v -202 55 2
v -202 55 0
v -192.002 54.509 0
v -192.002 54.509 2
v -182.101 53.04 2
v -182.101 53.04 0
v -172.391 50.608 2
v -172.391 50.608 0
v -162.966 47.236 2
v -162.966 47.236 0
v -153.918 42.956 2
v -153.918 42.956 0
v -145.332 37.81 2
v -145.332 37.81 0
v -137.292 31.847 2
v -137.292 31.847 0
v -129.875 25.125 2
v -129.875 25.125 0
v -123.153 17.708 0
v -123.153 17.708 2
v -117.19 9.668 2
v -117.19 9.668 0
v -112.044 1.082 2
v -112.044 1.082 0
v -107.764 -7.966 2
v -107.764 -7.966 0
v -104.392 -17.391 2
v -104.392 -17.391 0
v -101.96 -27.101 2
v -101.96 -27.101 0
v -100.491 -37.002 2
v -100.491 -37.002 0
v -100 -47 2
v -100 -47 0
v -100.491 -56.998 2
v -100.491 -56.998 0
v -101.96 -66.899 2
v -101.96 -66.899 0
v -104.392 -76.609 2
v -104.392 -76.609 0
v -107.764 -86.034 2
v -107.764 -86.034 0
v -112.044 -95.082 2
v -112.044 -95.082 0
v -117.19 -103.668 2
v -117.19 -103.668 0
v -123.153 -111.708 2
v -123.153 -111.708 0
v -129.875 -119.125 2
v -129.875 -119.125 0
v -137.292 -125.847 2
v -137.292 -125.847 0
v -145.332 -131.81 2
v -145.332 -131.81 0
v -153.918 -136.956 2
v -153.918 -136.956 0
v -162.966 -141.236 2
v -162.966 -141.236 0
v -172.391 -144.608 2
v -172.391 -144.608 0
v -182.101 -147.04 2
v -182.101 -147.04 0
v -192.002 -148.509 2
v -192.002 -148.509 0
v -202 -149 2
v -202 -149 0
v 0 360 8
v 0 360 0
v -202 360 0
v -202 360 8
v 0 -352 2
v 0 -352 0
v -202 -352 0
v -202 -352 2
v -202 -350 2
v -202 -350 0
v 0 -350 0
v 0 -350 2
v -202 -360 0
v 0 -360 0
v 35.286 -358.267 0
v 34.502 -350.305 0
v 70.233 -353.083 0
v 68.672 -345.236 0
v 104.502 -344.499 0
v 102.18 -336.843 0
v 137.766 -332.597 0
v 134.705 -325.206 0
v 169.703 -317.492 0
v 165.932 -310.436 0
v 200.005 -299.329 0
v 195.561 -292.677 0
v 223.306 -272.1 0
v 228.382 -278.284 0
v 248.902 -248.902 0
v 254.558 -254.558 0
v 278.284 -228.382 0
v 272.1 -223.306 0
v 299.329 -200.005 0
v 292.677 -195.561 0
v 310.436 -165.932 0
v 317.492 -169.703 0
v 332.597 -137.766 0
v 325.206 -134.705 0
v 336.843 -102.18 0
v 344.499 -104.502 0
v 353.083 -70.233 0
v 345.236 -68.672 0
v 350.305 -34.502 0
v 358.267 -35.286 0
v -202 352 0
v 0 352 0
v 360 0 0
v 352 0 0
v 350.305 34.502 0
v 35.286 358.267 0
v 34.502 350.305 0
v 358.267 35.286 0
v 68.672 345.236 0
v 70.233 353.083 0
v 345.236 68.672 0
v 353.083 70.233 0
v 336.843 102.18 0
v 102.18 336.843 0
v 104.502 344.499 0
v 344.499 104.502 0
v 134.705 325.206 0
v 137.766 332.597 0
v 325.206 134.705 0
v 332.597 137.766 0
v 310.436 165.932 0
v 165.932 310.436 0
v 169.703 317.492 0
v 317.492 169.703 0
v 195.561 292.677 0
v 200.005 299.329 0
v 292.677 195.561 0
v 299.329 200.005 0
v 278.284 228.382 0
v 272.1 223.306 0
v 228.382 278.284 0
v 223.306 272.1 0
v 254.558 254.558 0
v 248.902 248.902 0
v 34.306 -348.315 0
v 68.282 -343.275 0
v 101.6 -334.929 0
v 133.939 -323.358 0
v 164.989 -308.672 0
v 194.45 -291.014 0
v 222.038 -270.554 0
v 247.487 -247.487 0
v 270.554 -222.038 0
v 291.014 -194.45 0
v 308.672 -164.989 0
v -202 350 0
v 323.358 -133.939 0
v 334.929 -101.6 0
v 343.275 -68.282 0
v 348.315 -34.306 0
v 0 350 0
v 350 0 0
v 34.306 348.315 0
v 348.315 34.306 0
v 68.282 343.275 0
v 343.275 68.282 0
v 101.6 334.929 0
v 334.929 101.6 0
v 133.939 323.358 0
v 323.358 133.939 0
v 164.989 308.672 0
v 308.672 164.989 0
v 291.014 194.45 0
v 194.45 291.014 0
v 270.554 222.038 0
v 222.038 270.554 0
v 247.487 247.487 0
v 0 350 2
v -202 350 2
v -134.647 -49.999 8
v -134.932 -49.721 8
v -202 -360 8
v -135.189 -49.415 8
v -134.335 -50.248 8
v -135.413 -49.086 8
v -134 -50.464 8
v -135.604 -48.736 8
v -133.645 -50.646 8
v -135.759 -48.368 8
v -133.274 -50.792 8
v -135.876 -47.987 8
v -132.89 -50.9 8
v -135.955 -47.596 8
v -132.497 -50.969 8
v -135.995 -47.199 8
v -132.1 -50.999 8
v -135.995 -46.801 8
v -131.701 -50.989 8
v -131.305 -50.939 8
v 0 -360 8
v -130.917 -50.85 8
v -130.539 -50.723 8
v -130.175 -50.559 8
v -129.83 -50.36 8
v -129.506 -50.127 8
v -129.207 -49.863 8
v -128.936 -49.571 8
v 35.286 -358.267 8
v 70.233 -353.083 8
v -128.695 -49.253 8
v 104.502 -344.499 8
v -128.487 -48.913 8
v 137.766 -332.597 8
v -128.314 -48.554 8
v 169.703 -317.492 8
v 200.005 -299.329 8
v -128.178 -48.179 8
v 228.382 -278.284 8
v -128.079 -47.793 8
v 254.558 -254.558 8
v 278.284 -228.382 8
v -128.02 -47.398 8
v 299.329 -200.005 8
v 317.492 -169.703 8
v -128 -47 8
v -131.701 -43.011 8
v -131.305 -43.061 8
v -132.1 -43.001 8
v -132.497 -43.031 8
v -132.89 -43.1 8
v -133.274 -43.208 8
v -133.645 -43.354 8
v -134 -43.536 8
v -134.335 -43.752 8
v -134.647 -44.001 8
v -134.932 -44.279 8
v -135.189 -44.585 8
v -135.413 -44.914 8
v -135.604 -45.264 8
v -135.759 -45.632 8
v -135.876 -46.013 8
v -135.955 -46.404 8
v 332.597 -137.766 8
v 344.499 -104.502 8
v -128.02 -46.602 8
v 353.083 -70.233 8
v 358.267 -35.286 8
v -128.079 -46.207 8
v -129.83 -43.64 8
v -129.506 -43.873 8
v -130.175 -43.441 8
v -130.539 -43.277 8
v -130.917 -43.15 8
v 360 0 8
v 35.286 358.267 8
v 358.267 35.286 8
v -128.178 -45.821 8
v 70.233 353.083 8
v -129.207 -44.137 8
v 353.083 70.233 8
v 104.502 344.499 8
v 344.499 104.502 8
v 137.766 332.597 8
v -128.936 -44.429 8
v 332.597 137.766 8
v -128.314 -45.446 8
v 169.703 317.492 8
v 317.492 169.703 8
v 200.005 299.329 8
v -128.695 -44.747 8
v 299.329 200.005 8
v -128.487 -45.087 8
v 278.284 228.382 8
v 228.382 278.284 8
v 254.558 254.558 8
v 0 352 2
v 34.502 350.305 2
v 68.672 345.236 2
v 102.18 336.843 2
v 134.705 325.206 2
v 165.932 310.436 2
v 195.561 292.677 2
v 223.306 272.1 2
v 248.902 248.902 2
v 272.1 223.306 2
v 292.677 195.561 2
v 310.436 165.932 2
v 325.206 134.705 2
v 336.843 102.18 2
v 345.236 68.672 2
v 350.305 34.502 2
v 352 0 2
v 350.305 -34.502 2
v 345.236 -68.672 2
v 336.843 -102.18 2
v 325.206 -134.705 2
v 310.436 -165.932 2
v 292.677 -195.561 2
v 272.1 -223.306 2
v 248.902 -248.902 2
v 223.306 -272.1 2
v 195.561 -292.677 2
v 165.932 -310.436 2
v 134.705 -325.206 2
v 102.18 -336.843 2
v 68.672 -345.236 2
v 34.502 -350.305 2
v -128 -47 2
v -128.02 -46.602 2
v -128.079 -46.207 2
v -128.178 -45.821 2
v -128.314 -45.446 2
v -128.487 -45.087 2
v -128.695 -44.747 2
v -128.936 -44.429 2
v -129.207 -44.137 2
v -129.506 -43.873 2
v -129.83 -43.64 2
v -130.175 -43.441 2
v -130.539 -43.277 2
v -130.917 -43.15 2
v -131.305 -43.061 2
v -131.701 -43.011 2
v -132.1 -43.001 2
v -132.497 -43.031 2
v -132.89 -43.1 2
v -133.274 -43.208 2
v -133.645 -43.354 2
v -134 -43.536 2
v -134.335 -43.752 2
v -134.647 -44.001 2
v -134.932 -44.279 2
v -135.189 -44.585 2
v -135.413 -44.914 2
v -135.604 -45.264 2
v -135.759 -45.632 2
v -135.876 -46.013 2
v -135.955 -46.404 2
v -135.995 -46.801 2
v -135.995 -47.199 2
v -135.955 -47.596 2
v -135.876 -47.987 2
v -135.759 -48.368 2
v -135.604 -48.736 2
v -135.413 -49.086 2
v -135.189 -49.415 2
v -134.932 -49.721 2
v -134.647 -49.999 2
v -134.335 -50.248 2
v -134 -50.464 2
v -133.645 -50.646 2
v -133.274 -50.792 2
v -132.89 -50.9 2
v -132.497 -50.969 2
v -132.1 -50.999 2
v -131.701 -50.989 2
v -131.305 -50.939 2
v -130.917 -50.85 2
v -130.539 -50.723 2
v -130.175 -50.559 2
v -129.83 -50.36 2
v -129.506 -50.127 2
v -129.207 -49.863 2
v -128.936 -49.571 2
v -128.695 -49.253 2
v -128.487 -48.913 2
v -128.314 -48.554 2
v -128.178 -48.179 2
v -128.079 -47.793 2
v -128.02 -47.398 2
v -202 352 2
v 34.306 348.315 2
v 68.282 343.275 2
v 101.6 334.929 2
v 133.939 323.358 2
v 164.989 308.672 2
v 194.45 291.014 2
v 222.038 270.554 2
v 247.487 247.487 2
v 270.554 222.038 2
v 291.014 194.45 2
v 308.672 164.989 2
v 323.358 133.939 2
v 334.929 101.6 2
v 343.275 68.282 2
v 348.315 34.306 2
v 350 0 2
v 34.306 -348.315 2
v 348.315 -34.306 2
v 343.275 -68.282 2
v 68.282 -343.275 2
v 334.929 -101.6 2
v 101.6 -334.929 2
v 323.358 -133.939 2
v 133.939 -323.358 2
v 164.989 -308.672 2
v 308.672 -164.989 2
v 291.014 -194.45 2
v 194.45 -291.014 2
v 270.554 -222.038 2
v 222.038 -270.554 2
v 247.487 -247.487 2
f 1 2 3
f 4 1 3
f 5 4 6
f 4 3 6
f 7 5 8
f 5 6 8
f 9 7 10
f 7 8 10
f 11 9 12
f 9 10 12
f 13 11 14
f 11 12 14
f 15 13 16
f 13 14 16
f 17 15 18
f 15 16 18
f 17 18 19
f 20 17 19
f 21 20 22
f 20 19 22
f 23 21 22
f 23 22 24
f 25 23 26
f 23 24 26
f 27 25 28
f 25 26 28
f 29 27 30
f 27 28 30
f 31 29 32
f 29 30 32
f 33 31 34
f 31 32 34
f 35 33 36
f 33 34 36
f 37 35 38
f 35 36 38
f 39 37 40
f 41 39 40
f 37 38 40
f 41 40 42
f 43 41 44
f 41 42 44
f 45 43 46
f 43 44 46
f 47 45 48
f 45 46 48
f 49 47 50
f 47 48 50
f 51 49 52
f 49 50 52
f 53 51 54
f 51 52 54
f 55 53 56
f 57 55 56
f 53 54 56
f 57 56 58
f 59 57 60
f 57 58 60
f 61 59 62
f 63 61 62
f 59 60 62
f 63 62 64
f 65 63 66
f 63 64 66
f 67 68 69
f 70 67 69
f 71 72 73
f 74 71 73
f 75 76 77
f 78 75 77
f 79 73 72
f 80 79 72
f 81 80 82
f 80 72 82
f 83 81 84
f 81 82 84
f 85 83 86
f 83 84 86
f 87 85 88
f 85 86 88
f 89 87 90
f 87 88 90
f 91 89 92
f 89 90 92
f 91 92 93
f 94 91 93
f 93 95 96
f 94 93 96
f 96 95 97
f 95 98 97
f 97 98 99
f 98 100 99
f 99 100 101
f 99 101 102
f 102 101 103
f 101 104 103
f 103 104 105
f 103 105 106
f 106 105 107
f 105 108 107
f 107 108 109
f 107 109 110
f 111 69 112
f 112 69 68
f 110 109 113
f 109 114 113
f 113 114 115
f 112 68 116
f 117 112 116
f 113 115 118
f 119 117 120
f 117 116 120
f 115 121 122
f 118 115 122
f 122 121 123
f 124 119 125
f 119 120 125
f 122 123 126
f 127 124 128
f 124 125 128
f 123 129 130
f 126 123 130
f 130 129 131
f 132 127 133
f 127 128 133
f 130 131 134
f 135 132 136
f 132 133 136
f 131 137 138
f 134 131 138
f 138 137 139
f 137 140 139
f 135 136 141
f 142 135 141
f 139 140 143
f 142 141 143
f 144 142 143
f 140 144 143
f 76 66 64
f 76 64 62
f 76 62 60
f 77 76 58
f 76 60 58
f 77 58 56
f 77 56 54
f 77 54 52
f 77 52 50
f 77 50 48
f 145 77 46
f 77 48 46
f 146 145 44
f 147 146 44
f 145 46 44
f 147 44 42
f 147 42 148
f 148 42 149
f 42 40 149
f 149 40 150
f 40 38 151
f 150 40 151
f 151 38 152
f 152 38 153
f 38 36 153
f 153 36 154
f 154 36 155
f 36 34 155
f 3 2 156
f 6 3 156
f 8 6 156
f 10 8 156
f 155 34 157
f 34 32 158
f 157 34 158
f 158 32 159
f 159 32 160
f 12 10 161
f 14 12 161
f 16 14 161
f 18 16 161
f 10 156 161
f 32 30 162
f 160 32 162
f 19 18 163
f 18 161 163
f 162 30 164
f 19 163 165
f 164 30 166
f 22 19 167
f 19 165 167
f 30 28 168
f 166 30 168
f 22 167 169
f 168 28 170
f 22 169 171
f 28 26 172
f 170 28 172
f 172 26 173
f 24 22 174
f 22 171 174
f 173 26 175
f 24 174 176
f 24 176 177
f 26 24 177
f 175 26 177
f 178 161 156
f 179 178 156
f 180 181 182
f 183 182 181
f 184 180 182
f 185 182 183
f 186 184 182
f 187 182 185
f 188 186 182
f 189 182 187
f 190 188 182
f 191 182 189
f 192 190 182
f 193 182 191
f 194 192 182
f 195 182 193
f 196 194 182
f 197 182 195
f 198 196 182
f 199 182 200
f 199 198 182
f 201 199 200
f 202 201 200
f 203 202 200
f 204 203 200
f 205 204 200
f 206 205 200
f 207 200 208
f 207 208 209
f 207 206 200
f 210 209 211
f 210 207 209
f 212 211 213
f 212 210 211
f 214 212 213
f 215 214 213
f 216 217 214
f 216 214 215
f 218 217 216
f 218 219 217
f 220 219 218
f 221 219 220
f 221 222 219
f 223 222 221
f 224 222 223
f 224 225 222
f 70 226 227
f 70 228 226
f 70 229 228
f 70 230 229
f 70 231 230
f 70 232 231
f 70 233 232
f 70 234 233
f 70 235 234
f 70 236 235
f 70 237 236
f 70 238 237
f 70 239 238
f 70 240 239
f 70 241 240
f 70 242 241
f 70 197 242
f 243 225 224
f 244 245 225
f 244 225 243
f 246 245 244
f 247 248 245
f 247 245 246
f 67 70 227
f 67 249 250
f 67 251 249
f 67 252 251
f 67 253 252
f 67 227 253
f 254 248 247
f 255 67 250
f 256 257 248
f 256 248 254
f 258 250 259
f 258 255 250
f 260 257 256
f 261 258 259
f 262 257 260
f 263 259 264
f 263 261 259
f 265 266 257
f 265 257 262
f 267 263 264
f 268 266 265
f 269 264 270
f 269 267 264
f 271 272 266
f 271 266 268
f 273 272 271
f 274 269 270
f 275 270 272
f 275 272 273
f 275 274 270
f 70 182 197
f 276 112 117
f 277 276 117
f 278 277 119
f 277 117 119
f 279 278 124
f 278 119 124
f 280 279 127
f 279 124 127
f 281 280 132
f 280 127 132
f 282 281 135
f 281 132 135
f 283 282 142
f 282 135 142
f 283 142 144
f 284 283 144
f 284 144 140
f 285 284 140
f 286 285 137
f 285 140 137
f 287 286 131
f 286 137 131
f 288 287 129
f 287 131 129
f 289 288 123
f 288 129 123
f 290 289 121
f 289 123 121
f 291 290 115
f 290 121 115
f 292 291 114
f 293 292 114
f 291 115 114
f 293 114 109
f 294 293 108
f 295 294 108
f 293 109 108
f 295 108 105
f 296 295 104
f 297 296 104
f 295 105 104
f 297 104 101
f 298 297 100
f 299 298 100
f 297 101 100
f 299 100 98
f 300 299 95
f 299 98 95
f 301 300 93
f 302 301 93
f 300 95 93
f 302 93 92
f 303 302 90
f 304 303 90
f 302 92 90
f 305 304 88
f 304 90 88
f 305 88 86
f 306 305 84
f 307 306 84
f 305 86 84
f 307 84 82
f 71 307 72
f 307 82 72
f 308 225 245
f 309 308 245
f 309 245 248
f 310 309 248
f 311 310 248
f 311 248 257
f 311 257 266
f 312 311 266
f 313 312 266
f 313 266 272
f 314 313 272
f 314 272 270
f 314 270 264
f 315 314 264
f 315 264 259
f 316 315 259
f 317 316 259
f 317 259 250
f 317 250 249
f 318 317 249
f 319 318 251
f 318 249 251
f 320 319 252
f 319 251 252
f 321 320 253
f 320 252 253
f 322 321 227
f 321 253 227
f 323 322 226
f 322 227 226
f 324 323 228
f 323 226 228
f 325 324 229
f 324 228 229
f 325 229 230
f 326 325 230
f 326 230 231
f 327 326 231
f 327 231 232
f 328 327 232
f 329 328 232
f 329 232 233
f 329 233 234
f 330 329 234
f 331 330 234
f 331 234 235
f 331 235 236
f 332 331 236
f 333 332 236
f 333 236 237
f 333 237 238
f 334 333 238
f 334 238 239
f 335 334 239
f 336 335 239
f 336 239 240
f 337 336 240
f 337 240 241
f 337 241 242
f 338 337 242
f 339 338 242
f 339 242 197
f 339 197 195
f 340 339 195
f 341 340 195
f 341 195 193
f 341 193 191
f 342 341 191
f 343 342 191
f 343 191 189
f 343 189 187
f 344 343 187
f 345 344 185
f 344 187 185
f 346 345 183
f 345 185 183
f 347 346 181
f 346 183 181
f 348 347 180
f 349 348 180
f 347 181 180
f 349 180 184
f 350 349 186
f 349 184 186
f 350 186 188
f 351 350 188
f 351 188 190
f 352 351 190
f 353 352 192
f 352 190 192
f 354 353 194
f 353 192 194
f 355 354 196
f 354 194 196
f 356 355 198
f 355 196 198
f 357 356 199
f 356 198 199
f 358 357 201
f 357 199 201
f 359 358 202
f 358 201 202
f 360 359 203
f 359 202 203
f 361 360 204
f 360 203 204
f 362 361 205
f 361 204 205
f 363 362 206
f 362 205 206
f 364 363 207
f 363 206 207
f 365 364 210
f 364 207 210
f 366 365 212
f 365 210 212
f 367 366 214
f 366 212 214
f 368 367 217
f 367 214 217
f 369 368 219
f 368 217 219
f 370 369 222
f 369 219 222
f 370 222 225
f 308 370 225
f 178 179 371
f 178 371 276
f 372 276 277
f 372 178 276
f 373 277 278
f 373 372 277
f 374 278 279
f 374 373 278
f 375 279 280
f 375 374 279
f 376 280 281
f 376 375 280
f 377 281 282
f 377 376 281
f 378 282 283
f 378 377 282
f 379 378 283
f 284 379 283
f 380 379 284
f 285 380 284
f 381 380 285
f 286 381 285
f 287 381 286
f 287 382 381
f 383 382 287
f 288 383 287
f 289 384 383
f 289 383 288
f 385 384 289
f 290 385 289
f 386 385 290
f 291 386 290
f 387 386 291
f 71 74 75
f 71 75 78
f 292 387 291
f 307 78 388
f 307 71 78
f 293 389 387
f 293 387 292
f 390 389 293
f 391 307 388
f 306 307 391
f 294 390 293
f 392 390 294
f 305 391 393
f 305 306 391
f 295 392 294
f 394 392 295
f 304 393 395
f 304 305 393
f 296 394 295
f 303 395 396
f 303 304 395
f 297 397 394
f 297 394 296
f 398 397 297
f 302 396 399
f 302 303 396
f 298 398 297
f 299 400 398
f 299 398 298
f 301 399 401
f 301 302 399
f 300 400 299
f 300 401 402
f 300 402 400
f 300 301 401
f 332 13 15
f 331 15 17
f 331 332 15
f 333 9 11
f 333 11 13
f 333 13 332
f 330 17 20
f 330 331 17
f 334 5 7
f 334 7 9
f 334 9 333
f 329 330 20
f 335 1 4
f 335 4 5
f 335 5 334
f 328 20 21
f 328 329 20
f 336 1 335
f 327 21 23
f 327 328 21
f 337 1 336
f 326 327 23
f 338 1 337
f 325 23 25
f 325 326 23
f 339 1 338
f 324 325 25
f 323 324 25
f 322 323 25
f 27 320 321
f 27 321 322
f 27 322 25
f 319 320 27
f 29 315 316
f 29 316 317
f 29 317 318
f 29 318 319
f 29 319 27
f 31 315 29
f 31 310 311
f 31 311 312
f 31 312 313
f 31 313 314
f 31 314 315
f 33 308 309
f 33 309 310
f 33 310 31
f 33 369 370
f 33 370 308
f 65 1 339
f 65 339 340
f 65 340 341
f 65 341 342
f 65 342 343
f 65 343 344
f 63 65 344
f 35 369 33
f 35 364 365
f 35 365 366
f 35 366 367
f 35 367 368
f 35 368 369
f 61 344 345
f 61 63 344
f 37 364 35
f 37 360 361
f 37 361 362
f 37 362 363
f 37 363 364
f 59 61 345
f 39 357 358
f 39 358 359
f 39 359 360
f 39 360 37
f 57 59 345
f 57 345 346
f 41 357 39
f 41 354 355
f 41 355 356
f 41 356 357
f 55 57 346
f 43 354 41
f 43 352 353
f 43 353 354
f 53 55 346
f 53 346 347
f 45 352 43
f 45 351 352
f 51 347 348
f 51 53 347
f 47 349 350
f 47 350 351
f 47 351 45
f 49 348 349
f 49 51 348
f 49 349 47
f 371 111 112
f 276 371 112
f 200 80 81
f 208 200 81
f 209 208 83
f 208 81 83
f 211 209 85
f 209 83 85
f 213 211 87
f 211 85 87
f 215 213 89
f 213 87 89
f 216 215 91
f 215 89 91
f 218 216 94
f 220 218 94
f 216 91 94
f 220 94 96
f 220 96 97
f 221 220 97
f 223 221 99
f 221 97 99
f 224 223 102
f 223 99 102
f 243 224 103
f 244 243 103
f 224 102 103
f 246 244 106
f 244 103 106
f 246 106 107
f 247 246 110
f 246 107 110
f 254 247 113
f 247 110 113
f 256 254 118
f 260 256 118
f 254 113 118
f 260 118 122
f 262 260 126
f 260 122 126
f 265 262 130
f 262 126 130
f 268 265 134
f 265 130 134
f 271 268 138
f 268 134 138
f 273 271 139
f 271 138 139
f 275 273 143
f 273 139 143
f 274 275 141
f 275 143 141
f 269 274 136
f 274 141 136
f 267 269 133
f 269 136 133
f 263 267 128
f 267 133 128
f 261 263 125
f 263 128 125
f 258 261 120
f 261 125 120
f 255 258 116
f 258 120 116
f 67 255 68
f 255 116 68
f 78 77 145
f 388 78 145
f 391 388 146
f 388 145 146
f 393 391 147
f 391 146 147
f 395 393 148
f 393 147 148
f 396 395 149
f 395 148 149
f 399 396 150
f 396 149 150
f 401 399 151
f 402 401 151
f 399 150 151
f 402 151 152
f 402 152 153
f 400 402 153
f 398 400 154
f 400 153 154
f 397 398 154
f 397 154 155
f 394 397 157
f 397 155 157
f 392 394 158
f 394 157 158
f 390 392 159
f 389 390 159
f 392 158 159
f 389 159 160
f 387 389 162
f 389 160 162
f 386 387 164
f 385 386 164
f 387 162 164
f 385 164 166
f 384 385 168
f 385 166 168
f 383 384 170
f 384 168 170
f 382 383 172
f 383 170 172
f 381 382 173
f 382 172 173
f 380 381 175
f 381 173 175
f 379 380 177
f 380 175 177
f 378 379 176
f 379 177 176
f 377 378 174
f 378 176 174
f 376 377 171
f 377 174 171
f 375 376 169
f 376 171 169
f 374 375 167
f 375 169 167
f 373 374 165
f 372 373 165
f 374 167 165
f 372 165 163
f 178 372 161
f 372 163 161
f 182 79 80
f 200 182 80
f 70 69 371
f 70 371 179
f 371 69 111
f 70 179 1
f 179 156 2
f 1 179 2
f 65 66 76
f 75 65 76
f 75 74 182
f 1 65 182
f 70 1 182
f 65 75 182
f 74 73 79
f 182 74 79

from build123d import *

# Parameters (mm, degrees)
F1_DEPTH = 8
F3_DEPTH = 2
F4_R     = 4
F5_DEPTH = 8
F7_DEPTH = 2


with BuildPart() as f1:
    # F0 (on Top) → F1 (new body)
    with BuildSketch(Plane.XY):
        with BuildLine():
            Line((-202, -360), (0, -360))
            ThreePointArc((0, -360), (360, 0), (0, 360))
            Line((0, 360), (-202, 360))
            Line((-202, 360), (-202, -360))
        make_face()
    extrude(amount=F1_DEPTH)

    # F2 (on face) → F3 (cut)
    with BuildSketch(Plane(origin=(0, 0, 0), x_dir=(1, 0, 0), z_dir=(0, 0, -1))):
        with BuildLine():
            ThreePointArc((0, 350), (350, 0), (0, -350))
            Line((0, -350), (-202, -350))
            Line((-202, -350), (-202, -352))
            Line((-202, -352), (0, -352))
            ThreePointArc((0, -352), (352, 0), (0, 352))
            Line((0, 352), (-202, 352))
            Line((-202, 352), (-202, 350))
            Line((-202, 350), (0, 350))
        make_face()
    extrude(amount=-F3_DEPTH, mode=Mode.SUBTRACT)

    # F4 (on face) → F5 (cut, through all)
    with BuildSketch(Plane.XY.offset(8)):
        with Locations((-132, -47)):
            Circle(F4_R)
    extrude(amount=-F5_DEPTH, mode=Mode.SUBTRACT)

    # F6 (on face) → F7 (cut)
    with BuildSketch(Plane(origin=(0, 0, 0), x_dir=(1, 0, 0), z_dir=(0, 0, -1))):
        with BuildLine():
            Line((-202, 149), (-202, -55))
            ThreePointArc((-202, -55), (-100, 47), (-202, 149))
        make_face()
    extrude(amount=-F7_DEPTH, mode=Mode.SUBTRACT)


solid = f1.part
